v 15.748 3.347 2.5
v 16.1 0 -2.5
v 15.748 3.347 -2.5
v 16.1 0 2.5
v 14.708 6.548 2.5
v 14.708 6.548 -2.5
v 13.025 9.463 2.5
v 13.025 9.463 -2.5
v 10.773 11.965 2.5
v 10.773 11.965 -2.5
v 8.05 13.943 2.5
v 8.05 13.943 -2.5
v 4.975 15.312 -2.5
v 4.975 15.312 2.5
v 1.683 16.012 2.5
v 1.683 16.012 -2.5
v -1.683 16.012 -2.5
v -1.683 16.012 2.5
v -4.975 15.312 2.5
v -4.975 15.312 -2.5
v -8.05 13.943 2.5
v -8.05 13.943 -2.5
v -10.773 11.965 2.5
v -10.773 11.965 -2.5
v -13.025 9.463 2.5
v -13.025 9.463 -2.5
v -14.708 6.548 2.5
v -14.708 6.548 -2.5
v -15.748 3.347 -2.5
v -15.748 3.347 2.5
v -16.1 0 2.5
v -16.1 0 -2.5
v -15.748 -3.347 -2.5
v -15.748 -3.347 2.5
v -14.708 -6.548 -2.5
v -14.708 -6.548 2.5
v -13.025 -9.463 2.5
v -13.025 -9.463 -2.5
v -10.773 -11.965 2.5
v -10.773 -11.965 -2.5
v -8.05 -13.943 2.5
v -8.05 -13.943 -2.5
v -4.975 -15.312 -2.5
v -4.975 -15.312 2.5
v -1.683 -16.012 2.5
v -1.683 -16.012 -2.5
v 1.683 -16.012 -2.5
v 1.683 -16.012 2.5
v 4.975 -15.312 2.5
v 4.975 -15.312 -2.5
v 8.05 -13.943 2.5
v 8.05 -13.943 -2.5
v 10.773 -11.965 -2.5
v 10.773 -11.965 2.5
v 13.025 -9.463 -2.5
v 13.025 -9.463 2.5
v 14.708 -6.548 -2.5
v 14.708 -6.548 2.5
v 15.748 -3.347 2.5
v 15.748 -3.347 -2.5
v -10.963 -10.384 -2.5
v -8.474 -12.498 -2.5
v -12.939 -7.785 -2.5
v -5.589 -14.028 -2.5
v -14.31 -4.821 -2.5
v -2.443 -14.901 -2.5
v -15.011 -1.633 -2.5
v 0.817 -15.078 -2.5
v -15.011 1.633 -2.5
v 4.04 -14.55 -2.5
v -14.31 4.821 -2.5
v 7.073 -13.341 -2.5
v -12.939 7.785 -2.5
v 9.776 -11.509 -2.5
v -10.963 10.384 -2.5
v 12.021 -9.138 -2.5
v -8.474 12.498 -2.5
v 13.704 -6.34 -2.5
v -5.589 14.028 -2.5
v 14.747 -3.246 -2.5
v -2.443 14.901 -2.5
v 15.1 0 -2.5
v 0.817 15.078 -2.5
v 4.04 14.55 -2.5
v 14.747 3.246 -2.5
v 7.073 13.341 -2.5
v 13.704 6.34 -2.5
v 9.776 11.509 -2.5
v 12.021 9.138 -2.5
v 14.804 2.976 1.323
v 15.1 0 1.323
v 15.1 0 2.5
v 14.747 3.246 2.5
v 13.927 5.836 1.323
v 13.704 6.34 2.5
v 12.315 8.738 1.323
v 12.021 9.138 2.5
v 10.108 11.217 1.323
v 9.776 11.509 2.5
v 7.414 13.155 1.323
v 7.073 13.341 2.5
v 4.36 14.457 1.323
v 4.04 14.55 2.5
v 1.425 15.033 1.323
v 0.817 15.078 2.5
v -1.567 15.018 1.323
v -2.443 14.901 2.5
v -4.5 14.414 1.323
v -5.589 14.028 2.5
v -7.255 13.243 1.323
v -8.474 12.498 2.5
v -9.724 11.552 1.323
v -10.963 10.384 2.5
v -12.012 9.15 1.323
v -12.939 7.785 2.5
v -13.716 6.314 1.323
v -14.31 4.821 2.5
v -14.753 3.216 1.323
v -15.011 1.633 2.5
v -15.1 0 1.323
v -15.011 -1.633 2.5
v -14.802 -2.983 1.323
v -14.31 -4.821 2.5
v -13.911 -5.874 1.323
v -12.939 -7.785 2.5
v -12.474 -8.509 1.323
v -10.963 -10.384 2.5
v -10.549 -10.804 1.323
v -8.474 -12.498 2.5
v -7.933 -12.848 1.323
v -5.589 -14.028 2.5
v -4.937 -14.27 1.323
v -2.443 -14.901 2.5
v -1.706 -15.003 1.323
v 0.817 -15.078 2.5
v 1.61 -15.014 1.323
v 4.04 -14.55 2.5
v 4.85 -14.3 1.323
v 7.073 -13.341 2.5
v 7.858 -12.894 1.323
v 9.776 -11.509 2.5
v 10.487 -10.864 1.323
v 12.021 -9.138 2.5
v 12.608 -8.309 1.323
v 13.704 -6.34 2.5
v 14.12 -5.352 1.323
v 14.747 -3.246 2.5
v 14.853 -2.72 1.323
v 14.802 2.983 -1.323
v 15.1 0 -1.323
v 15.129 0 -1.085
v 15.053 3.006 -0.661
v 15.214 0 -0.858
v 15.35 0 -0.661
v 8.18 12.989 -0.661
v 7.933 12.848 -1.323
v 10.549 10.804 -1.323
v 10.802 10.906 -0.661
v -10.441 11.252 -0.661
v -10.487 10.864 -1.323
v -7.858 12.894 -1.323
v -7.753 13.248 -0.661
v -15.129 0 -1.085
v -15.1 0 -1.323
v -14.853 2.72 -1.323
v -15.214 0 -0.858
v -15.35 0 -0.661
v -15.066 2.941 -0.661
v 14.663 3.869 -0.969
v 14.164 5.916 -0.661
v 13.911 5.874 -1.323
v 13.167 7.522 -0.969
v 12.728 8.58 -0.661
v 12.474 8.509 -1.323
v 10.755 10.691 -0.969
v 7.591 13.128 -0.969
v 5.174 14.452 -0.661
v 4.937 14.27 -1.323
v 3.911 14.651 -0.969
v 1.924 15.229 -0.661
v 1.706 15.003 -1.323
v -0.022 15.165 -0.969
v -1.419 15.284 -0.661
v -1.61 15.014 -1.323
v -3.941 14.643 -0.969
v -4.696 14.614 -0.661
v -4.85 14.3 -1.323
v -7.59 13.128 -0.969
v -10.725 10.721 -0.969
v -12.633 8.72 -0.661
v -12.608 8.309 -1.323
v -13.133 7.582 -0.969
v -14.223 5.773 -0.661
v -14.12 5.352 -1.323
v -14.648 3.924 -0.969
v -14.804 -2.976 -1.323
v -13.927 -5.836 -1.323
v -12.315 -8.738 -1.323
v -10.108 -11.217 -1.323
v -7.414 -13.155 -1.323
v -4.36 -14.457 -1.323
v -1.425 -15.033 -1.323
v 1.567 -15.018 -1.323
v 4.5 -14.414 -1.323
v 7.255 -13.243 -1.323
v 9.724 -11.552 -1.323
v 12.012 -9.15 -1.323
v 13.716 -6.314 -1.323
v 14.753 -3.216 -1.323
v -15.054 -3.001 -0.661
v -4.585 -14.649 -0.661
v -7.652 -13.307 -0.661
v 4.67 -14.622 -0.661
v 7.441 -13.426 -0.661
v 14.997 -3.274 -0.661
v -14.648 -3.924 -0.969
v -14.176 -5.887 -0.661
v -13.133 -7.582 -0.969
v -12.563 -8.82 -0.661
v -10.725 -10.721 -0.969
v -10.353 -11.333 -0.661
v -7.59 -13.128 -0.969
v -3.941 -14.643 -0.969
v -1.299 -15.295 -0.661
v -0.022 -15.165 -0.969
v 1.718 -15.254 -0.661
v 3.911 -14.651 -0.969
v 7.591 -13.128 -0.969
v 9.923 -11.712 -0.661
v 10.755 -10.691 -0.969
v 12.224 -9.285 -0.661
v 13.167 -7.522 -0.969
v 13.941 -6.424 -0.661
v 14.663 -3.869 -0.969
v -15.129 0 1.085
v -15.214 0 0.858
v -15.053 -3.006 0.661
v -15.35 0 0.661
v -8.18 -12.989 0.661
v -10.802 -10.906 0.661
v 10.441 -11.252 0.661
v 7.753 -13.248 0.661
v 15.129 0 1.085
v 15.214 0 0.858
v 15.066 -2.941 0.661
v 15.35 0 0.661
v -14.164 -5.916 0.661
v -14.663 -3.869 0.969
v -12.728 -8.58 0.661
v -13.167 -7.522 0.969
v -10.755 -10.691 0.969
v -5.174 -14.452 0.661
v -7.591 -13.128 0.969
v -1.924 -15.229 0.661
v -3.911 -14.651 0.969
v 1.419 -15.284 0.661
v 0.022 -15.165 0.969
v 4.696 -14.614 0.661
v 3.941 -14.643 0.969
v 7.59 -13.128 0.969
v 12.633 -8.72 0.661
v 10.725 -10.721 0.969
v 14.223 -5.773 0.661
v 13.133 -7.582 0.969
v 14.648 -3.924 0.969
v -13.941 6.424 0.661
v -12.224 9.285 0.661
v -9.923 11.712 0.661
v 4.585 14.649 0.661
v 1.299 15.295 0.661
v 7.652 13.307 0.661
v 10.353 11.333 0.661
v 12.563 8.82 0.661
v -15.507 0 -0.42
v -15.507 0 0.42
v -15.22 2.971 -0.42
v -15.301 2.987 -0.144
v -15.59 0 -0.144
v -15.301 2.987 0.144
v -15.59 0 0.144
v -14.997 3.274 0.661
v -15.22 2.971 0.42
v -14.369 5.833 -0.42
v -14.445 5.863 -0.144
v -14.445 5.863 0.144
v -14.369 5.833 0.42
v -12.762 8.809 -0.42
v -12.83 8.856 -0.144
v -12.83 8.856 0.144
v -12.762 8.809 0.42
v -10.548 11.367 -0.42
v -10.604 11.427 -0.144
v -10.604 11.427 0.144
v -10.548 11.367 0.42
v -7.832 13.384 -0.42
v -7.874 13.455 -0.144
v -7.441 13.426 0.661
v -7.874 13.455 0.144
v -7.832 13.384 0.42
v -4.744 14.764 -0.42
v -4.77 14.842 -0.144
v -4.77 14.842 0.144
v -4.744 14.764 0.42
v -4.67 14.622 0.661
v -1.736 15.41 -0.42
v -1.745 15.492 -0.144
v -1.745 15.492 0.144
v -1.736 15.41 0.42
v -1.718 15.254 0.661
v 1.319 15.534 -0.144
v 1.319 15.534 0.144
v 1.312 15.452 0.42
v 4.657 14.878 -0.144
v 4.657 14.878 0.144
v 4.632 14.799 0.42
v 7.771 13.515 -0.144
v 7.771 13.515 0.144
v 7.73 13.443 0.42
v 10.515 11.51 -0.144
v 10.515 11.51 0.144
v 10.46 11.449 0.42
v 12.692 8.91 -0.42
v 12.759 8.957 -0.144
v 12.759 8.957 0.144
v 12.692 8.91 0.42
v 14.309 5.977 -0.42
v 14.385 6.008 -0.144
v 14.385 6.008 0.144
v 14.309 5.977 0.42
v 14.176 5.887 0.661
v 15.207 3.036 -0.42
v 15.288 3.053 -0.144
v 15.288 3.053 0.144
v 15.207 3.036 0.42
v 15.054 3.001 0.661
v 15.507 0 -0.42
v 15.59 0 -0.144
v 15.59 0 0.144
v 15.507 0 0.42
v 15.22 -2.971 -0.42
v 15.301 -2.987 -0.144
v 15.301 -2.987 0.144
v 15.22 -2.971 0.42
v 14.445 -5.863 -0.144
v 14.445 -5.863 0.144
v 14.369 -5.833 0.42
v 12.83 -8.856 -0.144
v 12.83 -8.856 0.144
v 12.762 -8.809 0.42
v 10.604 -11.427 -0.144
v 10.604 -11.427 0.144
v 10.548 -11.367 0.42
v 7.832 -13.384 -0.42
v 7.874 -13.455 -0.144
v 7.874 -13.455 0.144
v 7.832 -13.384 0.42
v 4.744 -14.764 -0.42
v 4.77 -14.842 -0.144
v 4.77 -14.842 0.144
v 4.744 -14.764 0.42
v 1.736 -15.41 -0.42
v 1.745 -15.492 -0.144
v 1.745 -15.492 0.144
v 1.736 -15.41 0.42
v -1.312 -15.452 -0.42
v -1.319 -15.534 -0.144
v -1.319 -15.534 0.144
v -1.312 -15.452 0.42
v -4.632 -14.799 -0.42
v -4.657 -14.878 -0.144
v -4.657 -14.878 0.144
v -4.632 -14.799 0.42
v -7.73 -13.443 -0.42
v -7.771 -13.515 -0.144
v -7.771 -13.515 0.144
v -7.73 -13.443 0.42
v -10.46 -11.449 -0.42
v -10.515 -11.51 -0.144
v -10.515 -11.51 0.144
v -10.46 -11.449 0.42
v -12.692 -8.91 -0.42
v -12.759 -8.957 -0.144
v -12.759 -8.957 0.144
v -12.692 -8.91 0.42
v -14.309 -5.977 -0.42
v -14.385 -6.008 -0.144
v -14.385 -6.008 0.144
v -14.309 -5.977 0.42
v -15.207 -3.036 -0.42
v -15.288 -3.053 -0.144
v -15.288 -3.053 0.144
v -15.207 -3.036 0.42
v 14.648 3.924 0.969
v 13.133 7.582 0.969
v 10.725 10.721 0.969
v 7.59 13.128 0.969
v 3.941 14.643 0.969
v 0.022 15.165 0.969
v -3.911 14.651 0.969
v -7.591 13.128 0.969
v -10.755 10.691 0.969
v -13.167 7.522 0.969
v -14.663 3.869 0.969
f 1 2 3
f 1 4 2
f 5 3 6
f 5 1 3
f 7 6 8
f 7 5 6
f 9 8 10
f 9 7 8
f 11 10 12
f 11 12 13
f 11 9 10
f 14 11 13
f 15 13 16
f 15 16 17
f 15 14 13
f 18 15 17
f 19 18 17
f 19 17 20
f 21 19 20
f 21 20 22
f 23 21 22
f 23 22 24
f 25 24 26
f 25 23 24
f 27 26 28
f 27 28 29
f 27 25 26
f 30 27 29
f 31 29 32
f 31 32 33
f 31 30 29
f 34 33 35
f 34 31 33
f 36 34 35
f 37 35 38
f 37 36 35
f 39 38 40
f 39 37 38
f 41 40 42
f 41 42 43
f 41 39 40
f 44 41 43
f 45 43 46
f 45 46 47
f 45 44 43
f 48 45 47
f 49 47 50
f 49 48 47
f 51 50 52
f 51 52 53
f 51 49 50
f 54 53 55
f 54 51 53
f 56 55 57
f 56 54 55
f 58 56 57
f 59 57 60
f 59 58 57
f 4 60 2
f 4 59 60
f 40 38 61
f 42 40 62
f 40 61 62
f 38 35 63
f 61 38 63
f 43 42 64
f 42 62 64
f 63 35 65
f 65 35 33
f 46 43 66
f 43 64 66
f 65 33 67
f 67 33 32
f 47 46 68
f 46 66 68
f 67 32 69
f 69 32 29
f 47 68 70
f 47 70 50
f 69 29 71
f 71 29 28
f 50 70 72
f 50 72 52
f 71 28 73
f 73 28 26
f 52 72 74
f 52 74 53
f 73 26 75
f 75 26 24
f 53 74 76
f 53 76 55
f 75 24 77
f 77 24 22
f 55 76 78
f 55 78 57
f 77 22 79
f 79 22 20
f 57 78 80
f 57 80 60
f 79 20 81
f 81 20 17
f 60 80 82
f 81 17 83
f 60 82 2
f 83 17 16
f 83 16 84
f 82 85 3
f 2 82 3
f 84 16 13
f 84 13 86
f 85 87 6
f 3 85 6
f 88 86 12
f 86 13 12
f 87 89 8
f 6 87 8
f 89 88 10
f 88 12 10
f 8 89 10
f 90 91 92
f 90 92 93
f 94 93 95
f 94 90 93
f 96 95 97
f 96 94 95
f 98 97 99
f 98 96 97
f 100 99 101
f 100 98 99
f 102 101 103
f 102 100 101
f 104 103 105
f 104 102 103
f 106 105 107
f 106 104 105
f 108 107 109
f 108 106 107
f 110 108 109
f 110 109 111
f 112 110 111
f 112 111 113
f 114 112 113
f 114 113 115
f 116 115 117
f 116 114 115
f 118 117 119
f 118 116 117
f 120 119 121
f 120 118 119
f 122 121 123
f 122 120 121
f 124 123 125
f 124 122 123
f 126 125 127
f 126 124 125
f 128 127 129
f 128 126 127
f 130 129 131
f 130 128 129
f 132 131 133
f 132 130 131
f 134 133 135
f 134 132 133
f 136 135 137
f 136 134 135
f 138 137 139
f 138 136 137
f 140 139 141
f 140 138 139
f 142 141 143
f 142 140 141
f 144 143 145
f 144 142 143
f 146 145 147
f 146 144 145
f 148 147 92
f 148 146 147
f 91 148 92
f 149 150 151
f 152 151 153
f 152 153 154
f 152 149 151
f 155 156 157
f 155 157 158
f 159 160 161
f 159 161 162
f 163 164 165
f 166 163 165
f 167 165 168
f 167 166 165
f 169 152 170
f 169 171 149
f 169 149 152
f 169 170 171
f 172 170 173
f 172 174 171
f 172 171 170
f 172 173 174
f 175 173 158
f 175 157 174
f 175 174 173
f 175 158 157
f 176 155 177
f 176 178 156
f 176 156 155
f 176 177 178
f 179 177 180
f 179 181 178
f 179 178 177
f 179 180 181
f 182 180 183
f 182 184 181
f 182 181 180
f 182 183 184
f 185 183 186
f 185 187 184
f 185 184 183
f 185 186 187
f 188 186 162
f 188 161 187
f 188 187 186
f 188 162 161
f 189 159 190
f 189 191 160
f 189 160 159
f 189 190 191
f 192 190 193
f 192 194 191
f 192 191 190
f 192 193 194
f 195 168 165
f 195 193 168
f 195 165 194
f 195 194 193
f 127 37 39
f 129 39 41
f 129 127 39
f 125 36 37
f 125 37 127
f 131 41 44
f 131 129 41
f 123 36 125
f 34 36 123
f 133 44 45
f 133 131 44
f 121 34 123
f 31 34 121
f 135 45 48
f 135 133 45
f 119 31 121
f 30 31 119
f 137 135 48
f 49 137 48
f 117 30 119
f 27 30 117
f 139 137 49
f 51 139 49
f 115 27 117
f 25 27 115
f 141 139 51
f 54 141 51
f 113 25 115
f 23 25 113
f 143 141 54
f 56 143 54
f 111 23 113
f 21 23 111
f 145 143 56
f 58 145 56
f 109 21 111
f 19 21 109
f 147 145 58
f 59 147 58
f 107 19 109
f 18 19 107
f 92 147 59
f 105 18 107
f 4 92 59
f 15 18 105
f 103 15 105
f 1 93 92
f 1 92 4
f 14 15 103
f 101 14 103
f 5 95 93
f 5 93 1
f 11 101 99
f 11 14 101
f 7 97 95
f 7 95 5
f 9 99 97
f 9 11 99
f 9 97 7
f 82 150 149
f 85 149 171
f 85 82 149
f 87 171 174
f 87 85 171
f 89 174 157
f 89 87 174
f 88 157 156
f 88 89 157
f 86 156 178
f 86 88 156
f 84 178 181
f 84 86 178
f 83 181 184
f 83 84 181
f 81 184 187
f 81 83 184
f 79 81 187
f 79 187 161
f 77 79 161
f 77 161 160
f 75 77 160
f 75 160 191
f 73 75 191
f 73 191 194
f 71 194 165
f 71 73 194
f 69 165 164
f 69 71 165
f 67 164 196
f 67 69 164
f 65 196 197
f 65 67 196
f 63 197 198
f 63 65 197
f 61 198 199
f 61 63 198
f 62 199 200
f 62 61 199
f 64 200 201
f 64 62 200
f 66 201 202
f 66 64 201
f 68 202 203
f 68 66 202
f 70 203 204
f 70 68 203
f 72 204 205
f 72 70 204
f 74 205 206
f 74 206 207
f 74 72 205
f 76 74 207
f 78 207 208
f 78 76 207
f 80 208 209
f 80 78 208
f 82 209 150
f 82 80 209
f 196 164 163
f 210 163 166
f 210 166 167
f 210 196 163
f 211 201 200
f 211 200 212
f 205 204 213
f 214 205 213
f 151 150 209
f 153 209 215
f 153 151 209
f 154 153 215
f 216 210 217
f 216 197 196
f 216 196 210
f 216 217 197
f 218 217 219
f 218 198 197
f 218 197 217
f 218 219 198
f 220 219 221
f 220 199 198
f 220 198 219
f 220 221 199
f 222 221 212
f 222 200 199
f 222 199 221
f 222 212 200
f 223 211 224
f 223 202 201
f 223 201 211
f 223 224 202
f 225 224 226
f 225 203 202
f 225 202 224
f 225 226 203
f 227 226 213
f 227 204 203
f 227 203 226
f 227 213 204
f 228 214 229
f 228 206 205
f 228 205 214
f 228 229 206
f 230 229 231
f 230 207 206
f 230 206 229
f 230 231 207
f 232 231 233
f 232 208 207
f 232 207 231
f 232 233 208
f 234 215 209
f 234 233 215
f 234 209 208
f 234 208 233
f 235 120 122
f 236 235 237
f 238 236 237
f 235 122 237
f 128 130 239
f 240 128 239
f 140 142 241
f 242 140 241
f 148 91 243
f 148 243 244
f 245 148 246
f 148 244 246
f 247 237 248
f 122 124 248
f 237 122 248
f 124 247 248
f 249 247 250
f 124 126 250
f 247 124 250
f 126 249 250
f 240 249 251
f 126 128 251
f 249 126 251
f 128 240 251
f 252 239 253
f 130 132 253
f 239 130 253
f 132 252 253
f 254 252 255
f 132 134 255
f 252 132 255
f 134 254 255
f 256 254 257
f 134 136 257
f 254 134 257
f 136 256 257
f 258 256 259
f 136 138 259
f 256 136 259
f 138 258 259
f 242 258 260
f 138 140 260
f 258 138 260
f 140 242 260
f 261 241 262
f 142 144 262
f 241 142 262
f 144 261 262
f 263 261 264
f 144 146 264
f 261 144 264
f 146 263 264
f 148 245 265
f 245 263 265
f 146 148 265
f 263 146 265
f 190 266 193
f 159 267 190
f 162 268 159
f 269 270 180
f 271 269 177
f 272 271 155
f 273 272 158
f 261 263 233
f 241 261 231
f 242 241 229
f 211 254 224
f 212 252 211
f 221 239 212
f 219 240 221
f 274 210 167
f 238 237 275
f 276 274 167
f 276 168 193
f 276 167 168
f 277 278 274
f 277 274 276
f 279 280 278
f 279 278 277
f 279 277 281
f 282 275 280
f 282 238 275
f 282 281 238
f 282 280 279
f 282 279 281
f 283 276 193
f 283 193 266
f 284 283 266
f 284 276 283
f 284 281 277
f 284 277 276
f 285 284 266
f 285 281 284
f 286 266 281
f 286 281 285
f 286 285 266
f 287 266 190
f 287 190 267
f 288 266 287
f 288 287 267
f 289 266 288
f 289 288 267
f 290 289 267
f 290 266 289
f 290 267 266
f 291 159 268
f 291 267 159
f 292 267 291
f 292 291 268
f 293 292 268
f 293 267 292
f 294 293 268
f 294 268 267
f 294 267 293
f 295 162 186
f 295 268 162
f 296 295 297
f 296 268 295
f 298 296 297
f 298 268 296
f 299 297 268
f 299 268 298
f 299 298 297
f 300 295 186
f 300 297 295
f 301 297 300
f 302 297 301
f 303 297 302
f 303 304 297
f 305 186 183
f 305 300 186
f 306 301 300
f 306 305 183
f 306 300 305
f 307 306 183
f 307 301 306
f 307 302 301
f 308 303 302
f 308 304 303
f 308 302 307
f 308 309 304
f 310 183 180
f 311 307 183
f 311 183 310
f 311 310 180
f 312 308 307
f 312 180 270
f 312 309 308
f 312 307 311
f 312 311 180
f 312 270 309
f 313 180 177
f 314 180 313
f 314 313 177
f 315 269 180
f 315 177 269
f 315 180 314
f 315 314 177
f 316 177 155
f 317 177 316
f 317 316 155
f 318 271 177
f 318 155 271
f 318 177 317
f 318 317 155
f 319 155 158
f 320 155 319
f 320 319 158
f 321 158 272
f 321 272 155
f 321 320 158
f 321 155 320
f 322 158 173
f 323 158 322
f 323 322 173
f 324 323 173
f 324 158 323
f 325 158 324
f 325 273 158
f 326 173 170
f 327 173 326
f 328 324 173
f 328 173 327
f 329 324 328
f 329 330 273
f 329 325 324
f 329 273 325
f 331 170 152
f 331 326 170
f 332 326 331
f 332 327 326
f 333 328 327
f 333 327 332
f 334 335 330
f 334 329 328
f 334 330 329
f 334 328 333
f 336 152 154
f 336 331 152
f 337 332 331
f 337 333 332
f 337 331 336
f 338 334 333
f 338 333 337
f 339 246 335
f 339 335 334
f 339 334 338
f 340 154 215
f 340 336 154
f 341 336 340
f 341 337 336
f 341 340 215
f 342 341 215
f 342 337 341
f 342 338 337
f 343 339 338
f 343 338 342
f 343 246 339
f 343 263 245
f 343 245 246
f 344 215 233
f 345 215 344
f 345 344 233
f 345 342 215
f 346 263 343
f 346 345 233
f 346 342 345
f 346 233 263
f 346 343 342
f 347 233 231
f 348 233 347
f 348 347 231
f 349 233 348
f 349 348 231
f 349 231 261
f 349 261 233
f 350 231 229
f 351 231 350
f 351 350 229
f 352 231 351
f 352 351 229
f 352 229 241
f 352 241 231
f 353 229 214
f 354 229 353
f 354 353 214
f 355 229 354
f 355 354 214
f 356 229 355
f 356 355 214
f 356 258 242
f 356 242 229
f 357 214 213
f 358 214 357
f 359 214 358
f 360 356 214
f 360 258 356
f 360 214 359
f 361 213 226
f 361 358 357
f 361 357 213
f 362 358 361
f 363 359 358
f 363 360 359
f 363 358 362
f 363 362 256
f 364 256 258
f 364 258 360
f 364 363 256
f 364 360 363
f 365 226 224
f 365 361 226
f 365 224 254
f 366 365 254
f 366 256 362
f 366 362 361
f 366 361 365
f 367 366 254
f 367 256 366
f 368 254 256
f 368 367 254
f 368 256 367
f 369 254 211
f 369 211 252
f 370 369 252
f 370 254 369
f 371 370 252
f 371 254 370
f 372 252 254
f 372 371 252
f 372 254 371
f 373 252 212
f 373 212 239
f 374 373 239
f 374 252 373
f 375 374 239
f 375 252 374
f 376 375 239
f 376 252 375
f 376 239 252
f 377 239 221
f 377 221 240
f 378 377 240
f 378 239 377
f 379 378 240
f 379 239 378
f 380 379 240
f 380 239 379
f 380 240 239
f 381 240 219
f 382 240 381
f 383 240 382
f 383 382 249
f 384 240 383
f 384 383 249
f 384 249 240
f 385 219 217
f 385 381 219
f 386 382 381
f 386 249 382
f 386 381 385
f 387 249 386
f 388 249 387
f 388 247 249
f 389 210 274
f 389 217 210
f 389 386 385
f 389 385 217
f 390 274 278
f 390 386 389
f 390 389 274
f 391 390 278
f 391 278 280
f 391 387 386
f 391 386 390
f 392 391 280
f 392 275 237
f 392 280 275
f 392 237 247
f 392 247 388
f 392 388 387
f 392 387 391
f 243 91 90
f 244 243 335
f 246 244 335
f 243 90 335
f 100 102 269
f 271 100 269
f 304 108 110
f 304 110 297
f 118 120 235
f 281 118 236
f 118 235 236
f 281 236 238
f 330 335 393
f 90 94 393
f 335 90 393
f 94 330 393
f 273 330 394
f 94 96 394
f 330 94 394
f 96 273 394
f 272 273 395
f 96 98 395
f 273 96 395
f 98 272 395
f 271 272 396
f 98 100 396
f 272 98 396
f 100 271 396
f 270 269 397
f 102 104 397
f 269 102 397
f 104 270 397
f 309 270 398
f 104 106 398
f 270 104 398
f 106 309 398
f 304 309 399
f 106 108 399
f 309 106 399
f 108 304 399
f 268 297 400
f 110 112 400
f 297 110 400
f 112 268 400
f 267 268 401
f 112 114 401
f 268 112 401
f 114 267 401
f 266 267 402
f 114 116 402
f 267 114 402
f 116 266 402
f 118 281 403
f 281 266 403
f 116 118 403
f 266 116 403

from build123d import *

# Parameters (mm, degrees)
SKETCH_1_R      = 16.1
SKETCH_1_R_2    = 15.1
EXTRUDE_1_DEPTH = 2.5
SKETCH_3_R      = 1
FILLET_1_R      = 1


with BuildPart() as part:
    # 草图1 → 凸台-拉伸1 (new body, symmetric)
    with BuildSketch(Plane.XY):
        Circle(SKETCH_1_R)
        Circle(SKETCH_1_R_2, mode=Mode.SUBTRACT)
    extrude(amount=EXTRUDE_1_DEPTH, both=True)

    # 草图3 → 切除-旋转1 (revolve, cut)
    with BuildSketch(Plane(origin=(0, 0, 0), x_dir=(1, 0, 0), z_dir=(0, 1, 0))):
        with Locations((-14.6, 0)):
            Circle(SKETCH_3_R)
    revolve(axis=Axis((0, 0, 2.5), (0, 0, -1)), mode=Mode.SUBTRACT)

    # 圆角1
    fillet_1_edges = [part.edges().sort_by_distance(p)[0] for p in [
        (0, 15.1, 0.866025404),
        (0, -15.1, -0.866025404),
    ]]
    fillet(fillet_1_edges, radius=FILLET_1_R)


solid = part.part
